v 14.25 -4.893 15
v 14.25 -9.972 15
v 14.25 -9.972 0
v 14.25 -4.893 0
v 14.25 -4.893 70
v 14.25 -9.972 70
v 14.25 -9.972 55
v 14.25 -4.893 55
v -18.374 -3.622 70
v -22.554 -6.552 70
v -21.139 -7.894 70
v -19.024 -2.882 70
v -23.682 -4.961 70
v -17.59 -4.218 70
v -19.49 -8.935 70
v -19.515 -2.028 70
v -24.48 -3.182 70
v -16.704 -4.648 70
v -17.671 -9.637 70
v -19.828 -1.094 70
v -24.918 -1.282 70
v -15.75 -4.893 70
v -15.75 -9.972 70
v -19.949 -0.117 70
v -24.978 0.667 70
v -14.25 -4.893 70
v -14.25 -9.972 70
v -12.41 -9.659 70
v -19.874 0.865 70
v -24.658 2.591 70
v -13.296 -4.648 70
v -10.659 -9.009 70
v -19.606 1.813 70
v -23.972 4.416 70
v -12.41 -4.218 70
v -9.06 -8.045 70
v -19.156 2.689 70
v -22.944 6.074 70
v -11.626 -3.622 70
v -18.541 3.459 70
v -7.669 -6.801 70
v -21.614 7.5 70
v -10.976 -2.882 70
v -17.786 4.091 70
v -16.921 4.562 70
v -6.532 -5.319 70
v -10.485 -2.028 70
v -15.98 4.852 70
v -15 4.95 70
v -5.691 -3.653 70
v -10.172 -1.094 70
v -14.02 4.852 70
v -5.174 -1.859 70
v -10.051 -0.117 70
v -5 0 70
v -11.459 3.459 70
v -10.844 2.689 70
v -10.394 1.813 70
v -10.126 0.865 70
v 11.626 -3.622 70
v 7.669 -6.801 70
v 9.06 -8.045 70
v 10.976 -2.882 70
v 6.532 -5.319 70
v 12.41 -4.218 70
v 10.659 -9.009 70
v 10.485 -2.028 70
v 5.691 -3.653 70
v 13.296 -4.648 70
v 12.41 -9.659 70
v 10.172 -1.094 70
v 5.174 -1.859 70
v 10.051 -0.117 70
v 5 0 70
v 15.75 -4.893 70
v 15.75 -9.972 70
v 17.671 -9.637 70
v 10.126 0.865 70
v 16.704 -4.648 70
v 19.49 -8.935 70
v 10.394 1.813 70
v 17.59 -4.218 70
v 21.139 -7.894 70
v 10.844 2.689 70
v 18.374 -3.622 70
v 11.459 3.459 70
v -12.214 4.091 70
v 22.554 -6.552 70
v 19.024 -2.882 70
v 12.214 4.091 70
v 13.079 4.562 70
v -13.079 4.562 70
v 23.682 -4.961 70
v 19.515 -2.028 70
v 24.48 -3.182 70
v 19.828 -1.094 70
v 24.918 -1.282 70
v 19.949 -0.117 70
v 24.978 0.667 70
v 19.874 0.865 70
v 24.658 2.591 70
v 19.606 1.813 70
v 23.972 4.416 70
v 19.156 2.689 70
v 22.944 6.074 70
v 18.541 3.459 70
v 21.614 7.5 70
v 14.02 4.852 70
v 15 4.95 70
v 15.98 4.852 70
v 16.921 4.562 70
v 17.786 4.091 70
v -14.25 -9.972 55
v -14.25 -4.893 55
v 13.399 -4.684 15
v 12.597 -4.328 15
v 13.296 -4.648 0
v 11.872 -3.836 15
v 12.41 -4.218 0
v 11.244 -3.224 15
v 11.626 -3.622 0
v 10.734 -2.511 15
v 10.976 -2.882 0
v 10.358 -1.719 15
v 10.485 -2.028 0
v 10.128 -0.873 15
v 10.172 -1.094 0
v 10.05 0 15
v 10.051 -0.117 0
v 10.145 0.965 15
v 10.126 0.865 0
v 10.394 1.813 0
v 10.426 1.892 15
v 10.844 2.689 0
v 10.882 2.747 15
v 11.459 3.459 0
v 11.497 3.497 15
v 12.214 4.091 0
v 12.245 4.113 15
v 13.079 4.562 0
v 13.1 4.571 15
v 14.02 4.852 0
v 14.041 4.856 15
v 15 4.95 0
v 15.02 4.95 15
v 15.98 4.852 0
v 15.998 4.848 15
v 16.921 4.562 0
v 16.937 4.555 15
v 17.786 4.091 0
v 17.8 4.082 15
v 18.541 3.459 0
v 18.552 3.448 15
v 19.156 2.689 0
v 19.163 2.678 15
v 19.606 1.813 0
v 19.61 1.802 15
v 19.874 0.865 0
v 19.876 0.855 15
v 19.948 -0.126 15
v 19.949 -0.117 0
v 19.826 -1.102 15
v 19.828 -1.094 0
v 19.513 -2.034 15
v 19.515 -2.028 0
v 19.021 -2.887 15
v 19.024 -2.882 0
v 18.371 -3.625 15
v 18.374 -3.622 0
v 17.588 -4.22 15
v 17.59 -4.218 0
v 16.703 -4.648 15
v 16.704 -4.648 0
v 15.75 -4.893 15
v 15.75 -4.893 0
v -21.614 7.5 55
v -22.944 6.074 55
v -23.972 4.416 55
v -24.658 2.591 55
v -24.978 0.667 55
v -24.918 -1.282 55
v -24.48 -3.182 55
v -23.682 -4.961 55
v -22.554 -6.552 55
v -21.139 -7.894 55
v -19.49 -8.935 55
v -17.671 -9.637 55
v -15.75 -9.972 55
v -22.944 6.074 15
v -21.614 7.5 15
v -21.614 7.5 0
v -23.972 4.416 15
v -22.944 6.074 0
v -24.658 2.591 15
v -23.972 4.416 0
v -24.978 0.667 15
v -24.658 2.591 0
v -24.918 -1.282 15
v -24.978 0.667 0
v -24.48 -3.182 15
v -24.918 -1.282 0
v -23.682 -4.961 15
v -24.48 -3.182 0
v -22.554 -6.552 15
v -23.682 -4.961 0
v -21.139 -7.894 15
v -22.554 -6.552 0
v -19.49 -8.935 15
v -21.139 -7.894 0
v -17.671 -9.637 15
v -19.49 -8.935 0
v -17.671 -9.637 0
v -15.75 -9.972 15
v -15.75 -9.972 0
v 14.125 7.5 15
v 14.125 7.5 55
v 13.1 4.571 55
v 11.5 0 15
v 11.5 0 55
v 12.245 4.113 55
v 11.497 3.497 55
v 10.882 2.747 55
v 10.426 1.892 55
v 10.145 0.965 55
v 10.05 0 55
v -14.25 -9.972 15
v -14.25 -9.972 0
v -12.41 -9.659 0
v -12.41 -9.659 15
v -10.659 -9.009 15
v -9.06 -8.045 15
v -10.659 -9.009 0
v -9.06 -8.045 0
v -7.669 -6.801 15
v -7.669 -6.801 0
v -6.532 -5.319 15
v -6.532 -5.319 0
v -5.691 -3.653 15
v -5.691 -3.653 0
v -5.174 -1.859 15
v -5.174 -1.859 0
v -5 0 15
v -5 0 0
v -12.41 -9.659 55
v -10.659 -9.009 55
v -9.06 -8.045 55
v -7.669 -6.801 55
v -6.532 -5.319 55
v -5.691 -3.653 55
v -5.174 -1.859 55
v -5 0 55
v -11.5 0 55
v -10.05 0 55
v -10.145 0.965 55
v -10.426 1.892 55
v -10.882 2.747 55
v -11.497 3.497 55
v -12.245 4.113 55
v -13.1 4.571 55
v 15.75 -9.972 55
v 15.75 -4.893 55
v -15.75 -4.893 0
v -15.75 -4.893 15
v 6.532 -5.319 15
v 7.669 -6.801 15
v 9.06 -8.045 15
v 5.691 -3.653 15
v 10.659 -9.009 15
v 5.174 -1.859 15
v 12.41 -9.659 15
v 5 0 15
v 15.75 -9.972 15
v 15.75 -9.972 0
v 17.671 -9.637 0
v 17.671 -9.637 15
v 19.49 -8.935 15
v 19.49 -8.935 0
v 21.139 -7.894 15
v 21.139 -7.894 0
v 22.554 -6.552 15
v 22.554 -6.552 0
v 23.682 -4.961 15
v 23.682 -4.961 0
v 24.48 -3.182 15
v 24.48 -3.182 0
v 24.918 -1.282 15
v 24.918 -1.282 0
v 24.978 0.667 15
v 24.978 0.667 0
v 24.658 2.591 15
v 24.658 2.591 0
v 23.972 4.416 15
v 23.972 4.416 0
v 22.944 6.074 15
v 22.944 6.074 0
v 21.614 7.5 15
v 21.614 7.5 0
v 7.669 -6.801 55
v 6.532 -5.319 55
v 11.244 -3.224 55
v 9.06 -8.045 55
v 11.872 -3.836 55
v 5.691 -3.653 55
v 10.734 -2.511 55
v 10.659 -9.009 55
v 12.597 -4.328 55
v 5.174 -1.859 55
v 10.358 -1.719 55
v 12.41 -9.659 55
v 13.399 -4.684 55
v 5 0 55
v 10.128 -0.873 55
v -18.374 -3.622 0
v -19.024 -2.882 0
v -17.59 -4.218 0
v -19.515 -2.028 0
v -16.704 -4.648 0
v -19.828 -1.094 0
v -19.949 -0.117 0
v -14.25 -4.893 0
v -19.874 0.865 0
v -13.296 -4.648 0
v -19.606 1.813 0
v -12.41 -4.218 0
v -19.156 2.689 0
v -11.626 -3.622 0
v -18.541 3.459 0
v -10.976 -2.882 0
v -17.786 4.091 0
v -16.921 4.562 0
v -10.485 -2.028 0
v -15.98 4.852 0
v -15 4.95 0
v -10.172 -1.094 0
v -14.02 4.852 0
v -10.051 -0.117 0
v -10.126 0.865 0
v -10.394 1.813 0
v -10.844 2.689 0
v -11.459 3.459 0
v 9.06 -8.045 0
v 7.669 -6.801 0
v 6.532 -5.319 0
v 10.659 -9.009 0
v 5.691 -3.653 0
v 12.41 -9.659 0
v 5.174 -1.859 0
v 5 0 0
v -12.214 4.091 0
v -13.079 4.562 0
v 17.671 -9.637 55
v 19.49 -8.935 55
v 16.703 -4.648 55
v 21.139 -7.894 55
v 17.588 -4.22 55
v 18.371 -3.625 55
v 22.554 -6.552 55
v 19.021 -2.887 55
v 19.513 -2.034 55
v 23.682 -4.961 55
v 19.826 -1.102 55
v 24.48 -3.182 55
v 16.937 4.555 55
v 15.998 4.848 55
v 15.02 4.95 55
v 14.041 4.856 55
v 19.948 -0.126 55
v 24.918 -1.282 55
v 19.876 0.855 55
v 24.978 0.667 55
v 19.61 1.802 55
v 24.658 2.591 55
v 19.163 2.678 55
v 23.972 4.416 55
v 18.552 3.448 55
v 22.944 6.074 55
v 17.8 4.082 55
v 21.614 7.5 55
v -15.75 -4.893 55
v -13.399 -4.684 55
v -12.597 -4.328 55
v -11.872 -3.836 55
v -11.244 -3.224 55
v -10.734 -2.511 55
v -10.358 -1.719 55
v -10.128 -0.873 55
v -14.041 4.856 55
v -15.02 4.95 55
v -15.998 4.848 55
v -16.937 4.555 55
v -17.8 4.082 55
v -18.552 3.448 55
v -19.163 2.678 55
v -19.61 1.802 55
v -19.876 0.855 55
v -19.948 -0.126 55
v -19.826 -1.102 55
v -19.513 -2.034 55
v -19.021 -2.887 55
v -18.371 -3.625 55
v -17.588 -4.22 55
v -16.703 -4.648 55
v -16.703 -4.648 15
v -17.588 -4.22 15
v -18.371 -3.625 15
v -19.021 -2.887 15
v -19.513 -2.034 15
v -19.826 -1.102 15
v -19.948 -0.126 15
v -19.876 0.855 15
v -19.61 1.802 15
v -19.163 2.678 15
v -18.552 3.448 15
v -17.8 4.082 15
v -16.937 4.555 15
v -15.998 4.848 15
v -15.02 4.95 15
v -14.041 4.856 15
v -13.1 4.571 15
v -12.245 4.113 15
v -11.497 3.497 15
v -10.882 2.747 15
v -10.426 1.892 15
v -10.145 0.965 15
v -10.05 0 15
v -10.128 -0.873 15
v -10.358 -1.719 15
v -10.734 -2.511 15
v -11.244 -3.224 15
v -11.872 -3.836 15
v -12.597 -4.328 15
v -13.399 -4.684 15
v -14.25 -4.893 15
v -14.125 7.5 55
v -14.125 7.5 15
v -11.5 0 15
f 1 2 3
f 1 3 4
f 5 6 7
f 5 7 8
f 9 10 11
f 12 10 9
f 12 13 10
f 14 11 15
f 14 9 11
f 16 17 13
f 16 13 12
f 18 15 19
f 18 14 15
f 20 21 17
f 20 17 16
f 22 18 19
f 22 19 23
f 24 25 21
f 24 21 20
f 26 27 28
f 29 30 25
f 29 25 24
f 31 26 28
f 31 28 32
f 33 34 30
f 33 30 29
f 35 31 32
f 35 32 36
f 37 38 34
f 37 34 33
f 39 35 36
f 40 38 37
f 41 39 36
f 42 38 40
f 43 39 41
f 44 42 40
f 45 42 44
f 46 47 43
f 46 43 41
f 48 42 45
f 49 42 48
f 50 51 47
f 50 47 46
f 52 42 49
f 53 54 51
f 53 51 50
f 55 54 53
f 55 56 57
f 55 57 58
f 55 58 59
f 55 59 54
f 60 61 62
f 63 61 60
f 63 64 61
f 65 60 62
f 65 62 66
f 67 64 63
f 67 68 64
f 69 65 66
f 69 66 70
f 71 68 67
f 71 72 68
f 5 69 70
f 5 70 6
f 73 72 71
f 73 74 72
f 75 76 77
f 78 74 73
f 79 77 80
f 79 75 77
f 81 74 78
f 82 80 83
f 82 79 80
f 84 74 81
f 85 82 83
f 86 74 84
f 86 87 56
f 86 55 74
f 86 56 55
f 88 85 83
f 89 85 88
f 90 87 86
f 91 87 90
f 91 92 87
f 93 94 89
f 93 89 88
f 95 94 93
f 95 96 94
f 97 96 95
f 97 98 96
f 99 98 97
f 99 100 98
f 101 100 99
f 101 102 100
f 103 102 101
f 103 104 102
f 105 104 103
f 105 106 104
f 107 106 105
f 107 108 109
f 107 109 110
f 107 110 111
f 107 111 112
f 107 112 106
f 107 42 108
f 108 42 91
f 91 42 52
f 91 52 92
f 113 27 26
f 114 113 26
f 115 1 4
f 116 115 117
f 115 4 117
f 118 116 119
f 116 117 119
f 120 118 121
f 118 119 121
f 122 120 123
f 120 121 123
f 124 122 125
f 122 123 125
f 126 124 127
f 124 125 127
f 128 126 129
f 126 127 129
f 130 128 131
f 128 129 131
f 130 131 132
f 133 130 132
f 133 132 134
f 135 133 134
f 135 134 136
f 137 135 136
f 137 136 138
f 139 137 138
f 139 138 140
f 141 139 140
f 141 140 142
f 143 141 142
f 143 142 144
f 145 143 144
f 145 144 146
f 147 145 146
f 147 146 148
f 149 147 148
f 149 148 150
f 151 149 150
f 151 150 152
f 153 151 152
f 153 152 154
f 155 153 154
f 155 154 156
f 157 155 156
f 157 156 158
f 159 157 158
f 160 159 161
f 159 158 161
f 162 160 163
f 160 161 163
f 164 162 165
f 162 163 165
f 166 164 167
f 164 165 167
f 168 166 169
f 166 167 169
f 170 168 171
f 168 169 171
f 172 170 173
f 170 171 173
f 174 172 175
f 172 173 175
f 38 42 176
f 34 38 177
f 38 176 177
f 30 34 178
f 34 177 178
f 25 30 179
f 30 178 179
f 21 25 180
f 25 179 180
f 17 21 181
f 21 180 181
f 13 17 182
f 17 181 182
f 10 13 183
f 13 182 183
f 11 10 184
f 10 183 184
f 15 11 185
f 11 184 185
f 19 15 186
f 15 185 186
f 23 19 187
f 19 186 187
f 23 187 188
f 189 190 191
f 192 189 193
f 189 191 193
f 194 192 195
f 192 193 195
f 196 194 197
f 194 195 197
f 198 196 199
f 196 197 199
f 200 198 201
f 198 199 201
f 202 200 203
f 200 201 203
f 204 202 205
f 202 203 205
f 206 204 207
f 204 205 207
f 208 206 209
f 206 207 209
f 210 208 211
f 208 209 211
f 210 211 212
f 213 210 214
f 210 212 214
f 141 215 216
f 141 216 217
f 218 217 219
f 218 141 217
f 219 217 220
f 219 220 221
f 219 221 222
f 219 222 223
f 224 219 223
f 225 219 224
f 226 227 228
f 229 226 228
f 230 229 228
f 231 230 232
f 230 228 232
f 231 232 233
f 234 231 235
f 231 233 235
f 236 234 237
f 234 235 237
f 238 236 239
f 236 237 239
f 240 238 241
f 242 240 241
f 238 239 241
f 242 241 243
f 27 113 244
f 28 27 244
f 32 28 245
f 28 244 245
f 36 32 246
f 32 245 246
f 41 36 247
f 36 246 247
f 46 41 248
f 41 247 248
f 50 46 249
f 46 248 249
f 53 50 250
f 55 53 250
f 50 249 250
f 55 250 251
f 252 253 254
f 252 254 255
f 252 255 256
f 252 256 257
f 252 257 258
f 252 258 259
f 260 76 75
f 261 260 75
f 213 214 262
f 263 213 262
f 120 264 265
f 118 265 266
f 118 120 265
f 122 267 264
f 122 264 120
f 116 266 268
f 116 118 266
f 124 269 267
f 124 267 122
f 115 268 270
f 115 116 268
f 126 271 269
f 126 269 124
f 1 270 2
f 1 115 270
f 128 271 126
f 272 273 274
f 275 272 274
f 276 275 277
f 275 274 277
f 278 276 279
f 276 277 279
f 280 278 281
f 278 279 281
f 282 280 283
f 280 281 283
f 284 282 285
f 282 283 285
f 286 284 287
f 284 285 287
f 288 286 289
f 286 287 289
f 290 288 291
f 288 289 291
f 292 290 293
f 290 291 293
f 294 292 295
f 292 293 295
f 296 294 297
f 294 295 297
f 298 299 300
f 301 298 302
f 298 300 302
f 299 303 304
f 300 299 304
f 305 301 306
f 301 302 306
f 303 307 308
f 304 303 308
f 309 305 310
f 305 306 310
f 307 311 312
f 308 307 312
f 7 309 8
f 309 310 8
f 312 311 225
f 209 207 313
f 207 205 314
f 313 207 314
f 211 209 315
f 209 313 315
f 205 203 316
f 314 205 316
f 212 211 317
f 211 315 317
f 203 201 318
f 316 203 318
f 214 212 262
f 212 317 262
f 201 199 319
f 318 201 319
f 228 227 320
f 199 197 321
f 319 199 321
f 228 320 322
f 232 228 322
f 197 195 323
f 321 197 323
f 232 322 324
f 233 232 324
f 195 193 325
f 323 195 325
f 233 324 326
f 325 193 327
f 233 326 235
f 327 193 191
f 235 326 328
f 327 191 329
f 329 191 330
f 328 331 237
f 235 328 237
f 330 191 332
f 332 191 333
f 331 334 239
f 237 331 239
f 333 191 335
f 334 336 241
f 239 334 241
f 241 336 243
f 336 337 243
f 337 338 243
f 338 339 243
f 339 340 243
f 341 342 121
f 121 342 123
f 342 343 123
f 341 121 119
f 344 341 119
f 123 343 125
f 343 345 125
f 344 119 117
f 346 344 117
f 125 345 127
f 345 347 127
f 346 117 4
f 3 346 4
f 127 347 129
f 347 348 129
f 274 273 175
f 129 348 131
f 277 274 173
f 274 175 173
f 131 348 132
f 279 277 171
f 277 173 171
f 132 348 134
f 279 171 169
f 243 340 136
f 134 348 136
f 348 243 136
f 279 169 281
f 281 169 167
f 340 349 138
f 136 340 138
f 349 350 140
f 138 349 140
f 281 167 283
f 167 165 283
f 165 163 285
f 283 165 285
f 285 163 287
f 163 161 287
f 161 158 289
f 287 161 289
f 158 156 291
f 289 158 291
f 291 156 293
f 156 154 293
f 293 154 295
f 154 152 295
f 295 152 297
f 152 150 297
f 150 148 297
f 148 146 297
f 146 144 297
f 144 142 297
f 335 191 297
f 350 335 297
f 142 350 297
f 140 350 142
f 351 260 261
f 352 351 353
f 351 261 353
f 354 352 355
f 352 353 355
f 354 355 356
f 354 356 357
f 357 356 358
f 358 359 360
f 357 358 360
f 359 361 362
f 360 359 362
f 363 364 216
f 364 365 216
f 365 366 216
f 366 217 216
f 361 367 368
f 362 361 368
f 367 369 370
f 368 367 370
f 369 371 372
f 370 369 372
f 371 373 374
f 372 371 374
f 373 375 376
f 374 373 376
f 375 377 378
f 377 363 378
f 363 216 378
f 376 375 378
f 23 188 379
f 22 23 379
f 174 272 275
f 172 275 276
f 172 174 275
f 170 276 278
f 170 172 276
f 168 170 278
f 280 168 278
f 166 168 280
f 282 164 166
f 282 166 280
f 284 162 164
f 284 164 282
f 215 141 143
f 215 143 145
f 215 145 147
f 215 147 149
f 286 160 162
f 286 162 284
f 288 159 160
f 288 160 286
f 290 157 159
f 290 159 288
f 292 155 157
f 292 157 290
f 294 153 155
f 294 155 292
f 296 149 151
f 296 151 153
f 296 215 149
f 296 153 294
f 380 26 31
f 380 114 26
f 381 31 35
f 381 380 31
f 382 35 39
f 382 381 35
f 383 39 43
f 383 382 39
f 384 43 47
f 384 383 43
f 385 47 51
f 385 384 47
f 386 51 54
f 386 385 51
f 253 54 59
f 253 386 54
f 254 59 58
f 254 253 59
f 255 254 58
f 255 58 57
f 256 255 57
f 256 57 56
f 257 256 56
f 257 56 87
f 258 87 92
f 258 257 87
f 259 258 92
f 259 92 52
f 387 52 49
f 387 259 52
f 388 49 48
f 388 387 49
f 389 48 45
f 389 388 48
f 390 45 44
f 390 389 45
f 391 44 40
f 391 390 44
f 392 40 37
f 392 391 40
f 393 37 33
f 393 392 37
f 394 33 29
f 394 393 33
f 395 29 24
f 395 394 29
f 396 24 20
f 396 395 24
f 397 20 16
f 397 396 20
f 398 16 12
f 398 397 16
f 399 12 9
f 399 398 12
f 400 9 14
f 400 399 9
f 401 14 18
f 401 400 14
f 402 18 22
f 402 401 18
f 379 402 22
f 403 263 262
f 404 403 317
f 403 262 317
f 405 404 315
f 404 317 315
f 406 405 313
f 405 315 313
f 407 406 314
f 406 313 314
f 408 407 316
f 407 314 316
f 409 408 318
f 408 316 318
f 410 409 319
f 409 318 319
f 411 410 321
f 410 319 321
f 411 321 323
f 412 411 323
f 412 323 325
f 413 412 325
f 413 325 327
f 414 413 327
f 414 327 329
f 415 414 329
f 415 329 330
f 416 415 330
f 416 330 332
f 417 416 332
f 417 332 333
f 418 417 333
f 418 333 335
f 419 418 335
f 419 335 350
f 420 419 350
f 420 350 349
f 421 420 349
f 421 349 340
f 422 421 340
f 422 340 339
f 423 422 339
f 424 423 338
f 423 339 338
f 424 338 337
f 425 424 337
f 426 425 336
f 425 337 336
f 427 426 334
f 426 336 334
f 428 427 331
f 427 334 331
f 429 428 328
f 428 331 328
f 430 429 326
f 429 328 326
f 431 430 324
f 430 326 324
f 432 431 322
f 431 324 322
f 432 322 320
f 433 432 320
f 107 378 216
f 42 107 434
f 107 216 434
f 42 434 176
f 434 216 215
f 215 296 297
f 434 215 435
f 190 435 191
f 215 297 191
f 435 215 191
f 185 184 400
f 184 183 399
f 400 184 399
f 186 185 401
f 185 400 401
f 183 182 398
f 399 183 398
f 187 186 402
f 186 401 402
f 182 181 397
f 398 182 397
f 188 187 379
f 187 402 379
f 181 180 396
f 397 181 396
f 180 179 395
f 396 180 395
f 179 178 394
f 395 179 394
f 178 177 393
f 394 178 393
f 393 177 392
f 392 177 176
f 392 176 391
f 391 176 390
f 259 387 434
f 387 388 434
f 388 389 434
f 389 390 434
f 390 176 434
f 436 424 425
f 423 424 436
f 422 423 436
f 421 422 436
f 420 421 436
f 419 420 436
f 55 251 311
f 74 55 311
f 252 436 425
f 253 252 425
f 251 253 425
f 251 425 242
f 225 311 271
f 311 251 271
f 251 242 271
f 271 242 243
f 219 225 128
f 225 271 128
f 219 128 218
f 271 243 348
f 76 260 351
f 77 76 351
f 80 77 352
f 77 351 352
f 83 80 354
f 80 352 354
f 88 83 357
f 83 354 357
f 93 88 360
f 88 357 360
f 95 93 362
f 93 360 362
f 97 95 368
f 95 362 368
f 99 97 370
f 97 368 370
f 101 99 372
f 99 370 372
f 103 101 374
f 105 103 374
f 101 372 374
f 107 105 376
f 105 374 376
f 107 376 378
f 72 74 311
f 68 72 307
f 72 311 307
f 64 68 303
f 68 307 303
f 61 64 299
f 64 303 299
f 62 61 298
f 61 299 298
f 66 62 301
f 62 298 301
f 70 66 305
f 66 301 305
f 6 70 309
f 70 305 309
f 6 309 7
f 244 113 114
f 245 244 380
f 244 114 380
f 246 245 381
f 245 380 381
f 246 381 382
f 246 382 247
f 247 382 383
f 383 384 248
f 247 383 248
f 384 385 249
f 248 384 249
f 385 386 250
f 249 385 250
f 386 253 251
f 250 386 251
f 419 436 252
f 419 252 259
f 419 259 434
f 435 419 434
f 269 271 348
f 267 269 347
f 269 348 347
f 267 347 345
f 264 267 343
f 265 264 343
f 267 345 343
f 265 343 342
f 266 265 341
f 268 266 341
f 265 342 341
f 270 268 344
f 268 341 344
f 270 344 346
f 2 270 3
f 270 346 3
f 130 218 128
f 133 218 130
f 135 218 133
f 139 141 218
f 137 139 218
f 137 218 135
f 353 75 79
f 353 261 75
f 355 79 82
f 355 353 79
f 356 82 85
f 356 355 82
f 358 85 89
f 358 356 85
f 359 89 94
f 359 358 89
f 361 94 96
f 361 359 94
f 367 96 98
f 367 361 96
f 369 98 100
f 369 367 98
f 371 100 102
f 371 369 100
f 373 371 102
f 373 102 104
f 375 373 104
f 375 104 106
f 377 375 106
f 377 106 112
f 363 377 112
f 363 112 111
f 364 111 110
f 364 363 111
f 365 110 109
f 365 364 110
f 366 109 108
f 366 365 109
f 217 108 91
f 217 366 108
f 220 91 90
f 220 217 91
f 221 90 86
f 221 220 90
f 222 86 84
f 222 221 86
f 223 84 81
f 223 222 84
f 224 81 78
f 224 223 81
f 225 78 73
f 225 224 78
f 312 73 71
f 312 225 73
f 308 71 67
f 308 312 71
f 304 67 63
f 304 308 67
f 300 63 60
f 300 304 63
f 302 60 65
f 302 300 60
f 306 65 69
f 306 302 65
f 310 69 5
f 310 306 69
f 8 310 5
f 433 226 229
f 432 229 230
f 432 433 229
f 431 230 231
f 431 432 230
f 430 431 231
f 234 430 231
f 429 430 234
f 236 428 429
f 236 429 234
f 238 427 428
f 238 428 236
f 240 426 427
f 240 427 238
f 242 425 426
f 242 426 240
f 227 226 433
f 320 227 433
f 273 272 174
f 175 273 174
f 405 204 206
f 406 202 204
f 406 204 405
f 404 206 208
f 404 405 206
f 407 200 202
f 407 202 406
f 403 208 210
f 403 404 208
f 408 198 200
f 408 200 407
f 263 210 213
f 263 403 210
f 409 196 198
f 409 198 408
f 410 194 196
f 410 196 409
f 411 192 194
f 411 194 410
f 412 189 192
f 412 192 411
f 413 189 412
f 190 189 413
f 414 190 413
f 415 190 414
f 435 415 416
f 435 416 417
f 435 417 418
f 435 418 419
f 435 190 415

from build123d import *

# Parameters (mm, degrees)
BOSS_EXTRUDE1_DEPTH = 15
BOSS_EXTRUDE2_DEPTH = 40
BOSS_EXTRUDE3_DEPTH = 15
SKETCH5_R           = 4.95
CUT_EXTRUDE1_DEPTH  = 15
CUT_EXTRUDE2_START  = -15
SKETCH6_R           = 4.95
CUT_EXTRUDE2_DEPTH  = 15
SKETCH7_W           = 1.5
SKETCH7_H           = 10
CUT_EXTRUDE3_DEPTH  = 76
SKETCH8_W           = 50
SKETCH8_H           = 2.5
CUT_EXTRUDE4_DEPTH  = 76


with BuildPart() as part:
    # Sketch2 → Boss-Extrude1 (new body)
    with BuildSketch(Plane.XY):
        with BuildLine():
            Line((-5, 10), (-15, 10))
            ThreePointArc((-15, 10), (-22.071067812, -7.071067812), (-5, 0))
            Line((-5, 0), (5, 0))
            ThreePointArc((5, 0), (22.071067812, -7.071067812), (15, 10))
            Line((15, 10), (5, 10))
            Line((5, 10), (-5, 10))
        make_face()
    extrude(amount=BOSS_EXTRUDE1_DEPTH)

    # Sketch3 → Boss-Extrude2 (add)
    with BuildSketch(Plane.XY.offset(15)):
        Polygon((-11.5, 0), (-15, 10), (15, 10), (11.5, 0), align=None)
    extrude(amount=BOSS_EXTRUDE2_DEPTH)

    # Sketch4 → Boss-Extrude3 (add)
    with BuildSketch(Plane.XY.offset(55)):
        with BuildLine():
            Line((-5, 10), (-15, 10))
            ThreePointArc((-15, 10), (-22.071067812, -7.071067812), (-5, 0))
            Line((-5, 0), (5, 0))
            ThreePointArc((5, 0), (22.071067812, -7.071067812), (15, 10))
            Line((15, 10), (5, 10))
            Line((5, 10), (-5, 10))
        make_face()
    extrude(amount=BOSS_EXTRUDE3_DEPTH)

    # Sketch5 → Cut-Extrude1 (cut)
    with BuildSketch(Plane(origin=(0, 0, 0), x_dir=(-1, 0, 0), z_dir=(0, 0, -1))):
        with Locations((15, 0)):
            Circle(SKETCH5_R)
        with Locations((-15, 0)):
            Circle(SKETCH5_R)
    extrude(amount=-CUT_EXTRUDE1_DEPTH, mode=Mode.SUBTRACT)

    # Sketch6 → Cut-Extrude2 (cut)
    with BuildSketch(Plane.XY.offset(70).offset(CUT_EXTRUDE2_START)):
        with Locations(Location((-15, 0, 0), (0, 0, 180))):
            Circle(SKETCH6_R)
        with Locations(Location((15, 0, 0), (0, 0, 180))):
            Circle(SKETCH6_R)
    extrude(amount=CUT_EXTRUDE2_DEPTH, mode=Mode.SUBTRACT)

    # Sketch7 → Cut-Extrude3 (cut, through all)
    with BuildSketch(Plane.XY.offset(70)):
        with Locations((-15, -5)):
            Rectangle(SKETCH7_W, SKETCH7_H)
        with Locations((15, -5)):
            Rectangle(SKETCH7_W, SKETCH7_H)
    extrude(amount=-CUT_EXTRUDE3_DEPTH, mode=Mode.SUBTRACT)

    # Sketch8 → Cut-Extrude4 (cut, through all)
    with BuildSketch(Plane(origin=(0, 0, 0), x_dir=(-1, 0, 0), z_dir=(0, 0, -1))):
        with Locations((0, 8.75)):
            Rectangle(SKETCH8_W, SKETCH8_H)
    extrude(amount=-CUT_EXTRUDE4_DEPTH, mode=Mode.SUBTRACT)


solid = part.part
